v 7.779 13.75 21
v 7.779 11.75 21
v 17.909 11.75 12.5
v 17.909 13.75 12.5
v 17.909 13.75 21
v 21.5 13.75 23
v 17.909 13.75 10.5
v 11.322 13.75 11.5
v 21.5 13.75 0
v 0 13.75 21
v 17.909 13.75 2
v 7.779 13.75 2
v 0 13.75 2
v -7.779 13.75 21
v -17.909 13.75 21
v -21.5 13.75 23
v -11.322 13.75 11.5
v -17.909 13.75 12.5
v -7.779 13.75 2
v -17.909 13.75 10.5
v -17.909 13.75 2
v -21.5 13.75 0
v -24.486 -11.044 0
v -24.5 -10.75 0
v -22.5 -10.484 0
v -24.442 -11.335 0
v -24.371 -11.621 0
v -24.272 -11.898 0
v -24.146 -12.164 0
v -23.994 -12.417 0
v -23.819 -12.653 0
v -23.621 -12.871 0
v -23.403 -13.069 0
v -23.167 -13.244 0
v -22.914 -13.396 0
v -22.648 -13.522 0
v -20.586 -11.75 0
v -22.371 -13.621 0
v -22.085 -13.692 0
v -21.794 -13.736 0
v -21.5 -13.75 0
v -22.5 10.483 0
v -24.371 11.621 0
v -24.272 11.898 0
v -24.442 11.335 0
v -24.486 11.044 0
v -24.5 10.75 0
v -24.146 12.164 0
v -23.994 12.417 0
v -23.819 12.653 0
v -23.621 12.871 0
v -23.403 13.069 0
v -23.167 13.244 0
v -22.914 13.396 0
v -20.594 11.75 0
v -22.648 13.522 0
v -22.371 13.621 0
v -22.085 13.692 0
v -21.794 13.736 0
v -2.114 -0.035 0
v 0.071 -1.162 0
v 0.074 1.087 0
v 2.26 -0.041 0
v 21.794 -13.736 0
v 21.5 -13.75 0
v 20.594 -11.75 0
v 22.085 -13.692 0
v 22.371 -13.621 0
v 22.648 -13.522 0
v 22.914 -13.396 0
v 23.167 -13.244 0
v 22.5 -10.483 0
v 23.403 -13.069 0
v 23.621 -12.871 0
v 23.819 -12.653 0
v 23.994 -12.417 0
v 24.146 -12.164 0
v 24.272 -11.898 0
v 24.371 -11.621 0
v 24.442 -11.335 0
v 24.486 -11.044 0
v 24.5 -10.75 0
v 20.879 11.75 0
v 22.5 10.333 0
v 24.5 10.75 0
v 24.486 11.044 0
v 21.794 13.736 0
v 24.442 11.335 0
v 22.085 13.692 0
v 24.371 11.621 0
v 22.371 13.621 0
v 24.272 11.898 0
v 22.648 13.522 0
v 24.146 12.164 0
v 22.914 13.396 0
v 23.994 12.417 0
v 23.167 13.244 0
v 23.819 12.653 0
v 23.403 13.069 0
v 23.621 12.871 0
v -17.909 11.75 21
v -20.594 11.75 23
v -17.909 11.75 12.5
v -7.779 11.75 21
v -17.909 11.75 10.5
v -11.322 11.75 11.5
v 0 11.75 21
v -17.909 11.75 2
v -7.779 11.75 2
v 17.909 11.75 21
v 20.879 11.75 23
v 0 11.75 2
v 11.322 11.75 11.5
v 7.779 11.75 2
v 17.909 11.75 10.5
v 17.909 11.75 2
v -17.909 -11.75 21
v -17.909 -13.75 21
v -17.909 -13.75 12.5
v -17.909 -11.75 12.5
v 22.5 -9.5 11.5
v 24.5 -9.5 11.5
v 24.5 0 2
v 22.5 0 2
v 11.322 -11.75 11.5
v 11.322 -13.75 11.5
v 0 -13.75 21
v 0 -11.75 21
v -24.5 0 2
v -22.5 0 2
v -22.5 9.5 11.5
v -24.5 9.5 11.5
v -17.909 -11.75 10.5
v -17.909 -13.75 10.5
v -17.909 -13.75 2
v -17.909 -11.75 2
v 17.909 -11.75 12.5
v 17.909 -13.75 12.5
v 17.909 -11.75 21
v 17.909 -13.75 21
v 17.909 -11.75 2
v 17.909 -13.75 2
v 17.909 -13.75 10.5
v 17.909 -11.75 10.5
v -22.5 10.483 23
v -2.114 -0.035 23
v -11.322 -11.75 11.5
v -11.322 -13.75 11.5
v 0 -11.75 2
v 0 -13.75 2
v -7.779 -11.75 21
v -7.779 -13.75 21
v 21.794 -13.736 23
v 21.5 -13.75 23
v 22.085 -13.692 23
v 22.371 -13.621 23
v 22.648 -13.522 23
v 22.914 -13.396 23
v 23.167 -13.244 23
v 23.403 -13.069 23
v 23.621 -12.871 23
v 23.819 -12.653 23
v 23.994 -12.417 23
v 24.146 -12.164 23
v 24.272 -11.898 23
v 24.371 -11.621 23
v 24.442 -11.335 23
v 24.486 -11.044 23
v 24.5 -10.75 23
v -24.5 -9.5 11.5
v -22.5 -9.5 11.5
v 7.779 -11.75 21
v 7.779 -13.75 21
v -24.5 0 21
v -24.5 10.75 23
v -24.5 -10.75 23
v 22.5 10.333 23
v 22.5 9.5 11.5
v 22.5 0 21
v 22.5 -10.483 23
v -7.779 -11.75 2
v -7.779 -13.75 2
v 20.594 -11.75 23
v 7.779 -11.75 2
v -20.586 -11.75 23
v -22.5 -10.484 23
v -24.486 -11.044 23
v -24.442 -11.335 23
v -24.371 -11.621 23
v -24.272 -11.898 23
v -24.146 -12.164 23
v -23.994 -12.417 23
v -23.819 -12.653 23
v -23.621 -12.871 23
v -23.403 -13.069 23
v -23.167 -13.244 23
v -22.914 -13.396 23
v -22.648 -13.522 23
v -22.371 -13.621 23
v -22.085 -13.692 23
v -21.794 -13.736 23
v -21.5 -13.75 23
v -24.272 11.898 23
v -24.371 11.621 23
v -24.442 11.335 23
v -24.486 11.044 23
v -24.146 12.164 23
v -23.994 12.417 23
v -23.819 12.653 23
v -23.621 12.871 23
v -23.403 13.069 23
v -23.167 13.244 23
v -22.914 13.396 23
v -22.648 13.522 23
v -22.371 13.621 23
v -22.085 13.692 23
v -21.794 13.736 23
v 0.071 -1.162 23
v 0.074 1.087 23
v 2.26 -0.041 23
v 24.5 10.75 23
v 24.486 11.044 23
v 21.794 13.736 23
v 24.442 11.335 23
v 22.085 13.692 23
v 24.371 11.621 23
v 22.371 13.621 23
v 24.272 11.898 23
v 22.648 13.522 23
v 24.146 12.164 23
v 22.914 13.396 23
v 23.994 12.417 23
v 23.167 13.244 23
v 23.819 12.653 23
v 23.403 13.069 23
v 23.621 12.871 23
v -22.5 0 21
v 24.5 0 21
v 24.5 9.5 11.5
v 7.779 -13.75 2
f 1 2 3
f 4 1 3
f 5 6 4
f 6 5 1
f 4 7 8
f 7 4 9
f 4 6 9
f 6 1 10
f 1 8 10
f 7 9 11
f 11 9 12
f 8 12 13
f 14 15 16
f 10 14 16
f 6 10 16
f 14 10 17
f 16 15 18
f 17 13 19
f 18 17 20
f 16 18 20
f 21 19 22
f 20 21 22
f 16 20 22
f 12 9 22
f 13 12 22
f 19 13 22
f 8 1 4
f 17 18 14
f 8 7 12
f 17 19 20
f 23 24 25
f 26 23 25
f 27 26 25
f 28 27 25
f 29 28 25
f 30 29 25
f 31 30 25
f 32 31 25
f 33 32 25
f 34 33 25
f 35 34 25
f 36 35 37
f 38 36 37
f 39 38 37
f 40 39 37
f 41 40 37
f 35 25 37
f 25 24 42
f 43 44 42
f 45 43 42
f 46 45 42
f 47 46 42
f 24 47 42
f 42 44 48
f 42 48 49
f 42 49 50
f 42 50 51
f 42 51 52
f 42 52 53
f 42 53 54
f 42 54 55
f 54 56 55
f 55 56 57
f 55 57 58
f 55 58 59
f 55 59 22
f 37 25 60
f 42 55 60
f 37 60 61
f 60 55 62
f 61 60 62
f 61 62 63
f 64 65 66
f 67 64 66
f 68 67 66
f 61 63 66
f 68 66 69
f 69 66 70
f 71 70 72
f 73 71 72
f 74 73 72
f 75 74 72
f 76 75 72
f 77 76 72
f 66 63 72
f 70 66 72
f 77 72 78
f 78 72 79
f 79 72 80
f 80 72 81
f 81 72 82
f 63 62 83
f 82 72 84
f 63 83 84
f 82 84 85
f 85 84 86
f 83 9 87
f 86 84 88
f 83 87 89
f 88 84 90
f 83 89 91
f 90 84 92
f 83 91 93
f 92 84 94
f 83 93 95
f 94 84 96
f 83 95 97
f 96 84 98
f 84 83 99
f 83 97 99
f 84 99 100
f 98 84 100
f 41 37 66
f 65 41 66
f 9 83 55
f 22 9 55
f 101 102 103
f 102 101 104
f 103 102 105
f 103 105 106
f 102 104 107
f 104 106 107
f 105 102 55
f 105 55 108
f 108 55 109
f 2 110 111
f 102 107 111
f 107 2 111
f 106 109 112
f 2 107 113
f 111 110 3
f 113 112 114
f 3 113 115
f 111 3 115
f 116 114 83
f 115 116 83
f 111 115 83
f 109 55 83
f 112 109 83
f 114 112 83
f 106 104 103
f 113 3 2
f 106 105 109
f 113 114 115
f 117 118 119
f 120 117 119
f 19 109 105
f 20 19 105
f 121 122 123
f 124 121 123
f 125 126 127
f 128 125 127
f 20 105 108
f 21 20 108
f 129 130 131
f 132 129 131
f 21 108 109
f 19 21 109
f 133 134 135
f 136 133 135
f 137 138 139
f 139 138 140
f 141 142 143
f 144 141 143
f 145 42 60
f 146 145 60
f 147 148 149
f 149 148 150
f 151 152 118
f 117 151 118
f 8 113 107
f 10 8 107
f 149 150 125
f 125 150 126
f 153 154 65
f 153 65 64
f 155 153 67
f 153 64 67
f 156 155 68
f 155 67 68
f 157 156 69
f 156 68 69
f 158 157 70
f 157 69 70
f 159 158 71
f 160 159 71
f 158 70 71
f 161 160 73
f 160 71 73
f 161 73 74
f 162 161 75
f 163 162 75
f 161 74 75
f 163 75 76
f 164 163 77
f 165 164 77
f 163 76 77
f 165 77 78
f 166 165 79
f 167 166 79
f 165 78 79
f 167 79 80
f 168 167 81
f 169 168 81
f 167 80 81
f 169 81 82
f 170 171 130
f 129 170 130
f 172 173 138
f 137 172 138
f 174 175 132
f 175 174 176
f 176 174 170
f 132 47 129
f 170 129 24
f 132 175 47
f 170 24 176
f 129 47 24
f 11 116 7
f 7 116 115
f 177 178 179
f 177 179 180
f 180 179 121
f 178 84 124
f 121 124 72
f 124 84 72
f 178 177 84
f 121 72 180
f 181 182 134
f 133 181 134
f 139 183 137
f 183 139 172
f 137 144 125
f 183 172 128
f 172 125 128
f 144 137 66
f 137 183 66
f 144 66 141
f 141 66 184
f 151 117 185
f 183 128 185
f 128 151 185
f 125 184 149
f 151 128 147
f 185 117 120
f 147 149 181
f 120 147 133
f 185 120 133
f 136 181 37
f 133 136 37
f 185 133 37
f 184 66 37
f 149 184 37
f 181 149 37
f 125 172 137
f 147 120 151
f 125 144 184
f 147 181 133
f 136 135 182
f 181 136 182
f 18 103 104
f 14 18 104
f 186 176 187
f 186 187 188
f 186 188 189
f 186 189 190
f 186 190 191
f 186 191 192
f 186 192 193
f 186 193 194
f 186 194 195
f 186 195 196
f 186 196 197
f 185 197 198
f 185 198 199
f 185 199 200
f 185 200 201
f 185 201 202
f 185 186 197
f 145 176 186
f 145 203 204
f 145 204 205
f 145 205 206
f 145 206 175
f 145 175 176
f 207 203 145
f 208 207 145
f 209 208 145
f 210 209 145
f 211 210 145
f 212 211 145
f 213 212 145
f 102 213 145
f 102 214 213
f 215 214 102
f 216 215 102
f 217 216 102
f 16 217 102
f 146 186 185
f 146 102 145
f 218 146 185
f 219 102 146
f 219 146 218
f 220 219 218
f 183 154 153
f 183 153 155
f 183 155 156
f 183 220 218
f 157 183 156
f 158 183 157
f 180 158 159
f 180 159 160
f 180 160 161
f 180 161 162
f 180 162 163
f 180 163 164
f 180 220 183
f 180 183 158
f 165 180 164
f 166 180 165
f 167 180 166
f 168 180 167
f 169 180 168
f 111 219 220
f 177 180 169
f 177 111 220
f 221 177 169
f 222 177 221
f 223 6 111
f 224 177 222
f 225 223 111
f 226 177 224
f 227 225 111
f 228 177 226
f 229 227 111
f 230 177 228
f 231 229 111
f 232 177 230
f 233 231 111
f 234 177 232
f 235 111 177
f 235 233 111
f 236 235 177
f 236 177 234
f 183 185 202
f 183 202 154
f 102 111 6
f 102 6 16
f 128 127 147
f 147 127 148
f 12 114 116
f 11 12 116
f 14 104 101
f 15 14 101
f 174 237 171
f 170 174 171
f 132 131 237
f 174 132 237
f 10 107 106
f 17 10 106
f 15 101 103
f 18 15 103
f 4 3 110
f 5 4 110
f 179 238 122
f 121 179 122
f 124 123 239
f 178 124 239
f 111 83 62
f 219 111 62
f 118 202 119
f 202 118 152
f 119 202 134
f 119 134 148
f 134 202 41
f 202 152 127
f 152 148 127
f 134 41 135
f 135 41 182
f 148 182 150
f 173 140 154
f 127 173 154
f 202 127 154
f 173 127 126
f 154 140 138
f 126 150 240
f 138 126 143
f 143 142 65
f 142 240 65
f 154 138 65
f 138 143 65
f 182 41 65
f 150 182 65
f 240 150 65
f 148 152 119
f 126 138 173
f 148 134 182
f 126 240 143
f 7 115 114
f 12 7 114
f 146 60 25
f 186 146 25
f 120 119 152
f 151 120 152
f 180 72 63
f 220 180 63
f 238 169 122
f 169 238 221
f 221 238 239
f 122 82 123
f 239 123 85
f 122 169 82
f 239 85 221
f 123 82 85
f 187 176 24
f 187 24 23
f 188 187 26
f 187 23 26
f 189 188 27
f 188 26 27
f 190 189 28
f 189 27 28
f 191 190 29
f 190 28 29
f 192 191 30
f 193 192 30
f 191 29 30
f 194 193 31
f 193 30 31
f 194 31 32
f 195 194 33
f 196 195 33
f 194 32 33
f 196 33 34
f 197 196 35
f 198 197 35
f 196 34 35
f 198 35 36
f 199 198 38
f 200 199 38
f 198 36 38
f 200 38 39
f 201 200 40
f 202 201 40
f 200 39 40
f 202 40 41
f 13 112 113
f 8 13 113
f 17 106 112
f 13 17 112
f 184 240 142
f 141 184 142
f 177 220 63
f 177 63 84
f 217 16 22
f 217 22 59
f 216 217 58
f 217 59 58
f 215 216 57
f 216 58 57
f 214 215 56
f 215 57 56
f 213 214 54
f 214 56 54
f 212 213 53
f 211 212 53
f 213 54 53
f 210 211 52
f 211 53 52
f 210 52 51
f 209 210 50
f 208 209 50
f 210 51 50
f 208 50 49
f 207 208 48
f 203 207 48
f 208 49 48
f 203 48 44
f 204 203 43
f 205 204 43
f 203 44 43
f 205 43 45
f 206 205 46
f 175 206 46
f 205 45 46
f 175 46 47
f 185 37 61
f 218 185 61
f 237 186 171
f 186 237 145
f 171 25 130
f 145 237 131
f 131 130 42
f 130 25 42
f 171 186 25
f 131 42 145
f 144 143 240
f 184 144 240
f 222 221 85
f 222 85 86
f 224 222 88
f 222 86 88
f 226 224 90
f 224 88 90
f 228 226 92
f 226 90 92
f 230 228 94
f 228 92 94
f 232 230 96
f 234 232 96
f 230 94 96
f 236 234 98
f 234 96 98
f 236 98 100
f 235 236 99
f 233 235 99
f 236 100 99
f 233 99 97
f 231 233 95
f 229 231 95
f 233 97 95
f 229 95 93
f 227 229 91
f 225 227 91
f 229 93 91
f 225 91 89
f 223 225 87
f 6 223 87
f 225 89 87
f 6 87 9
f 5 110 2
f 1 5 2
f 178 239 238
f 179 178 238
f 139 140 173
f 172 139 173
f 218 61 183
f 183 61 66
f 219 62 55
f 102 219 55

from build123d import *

# Parameters (mm, degrees)
F1_DEPTH = 23
F3_DEPTH = 40
F5_DEPTH = 60
F6_DEPTH = 23


with BuildPart() as f1:
    # F0 (on Top) → F1 (new body)
    with BuildSketch(Plane.XY):
        with BuildLine():
            ThreePointArc((-24.5, -10.75), (-23.62132, -12.87132), (-21.5, -13.75))
            Line((-21.5, -13.75), (21.5, -13.75))
            ThreePointArc((21.5, -13.75), (23.62132, -12.87132), (24.5, -10.75))
            Line((24.5, -10.75), (24.5, 10.75))
            ThreePointArc((24.5, 10.75), (23.62132, 12.87132), (21.5, 13.75))
            Line((21.5, 13.75), (-21.5, 13.75))
            ThreePointArc((-21.5, 13.75), (-23.62132, 12.87132), (-24.5, 10.75))
            Line((-24.5, 10.75), (-24.5, -10.75))
        make_face()
        with BuildLine():
            ThreePointArc((-21.5, -11.75), (-22.207107, -11.457107), (-22.5, -10.75))
            Line((-22.5, -10.75), (-22.5, -10.483528))
            Line((-22.5, -10.483528), (-22.5, 10.482972))
            Line((-22.5, 10.482972), (-22.5, 10.75))
            ThreePointArc((-22.5, 10.75), (-22.207107, 11.457107), (-21.5, 11.75))
            Line((-21.5, 11.75), (-20.593776, 11.75))
            Line((-20.593776, 11.75), (20.879046, 11.75))
            Line((20.879046, 11.75), (21.5, 11.75))
            ThreePointArc((21.5, 11.75), (22.207107, 11.457107), (22.5, 10.75))
            Line((22.5, 10.75), (22.5, 10.333408))
            Line((22.5, 10.333408), (22.5, -10.482972))
            Line((22.5, -10.482972), (22.5, -10.75))
            ThreePointArc((22.5, -10.75), (22.207107, -11.457107), (21.5, -11.75))
            Line((21.5, -11.75), (20.593776, -11.75))
            Line((20.593776, -11.75), (-20.586152, -11.75))
            Line((-20.586152, -11.75), (-21.5, -11.75))
        make_face(mode=Mode.SUBTRACT)
    extrude(amount=F1_DEPTH)

    # F2 (on face) → F3 (cut)
    with BuildSketch(Plane.XZ.offset(13.75)):
        Polygon((-17.908525, 12.5), (-7.778619, 21), (-17.908525, 21), align=None)
        Polygon((-11.321659, 11.5), (0, 2), (11.321659, 11.5), (0, 21), align=None)
        Polygon((-17.908525, 2), (-7.778619, 2), (-17.908525, 10.5), align=None)
        Polygon((17.908525, 10.5), (7.778619, 2), (17.908525, 2), align=None)
        Polygon((17.908525, 21), (7.778619, 21), (17.908525, 12.5), align=None)
    extrude(amount=-F3_DEPTH, mode=Mode.SUBTRACT)

    # F4 (on face) → F5 (cut)
    with BuildSketch(Plane.YZ.offset(24.5)):
        Polygon((-9.5, 11.5), (0, 2), (9.5, 11.5), (0, 21), align=None)
    extrude(amount=-F5_DEPTH, mode=Mode.SUBTRACT)

    # F0 (on Top) → F6 (join)
    with BuildSketch(Plane.XY):
        with BuildLine():
            Line((-22.5, -10.483528), (-22.5, -10.75))
            ThreePointArc((-22.5, -10.75), (-22.207107, -11.457107), (-21.5, -11.75))
            Line((-21.5, -11.75), (-20.586152, -11.75))
            Line((-20.586152, -11.75), (0.07148, -1.162122))
            Line((0.07148, -1.162122), (20.593776, -11.75))
            Line((20.593776, -11.75), (21.5, -11.75))
            ThreePointArc((21.5, -11.75), (22.207107, -11.457107), (22.5, -10.75))
            Line((22.5, -10.75), (22.5, -10.482972))
            Line((22.5, -10.482972), (2.259688, -0.040576))
            Line((2.259688, -0.040576), (22.5, 10.333408))
            Line((22.5, 10.333408), (22.5, 10.75))
            ThreePointArc((22.5, 10.75), (22.207107, 11.457107), (21.5, 11.75))
            Line((21.5, 11.75), (20.879046, 11.75))
            Line((20.879046, 11.75), (0.074486, 1.086815))
            Line((0.074486, 1.086815), (-20.593776, 11.75))
            Line((-20.593776, 11.75), (-21.5, 11.75))
            ThreePointArc((-21.5, 11.75), (-22.207107, 11.457107), (-22.5, 10.75))
            Line((-22.5, 10.75), (-22.5, 10.482972))
            Line((-22.5, 10.482972), (-2.113723, -0.034731))
            Line((-2.113723, -0.034731), (-22.5, -10.483528))
        make_face()
    extrude(amount=F6_DEPTH)


solid = f1.part
